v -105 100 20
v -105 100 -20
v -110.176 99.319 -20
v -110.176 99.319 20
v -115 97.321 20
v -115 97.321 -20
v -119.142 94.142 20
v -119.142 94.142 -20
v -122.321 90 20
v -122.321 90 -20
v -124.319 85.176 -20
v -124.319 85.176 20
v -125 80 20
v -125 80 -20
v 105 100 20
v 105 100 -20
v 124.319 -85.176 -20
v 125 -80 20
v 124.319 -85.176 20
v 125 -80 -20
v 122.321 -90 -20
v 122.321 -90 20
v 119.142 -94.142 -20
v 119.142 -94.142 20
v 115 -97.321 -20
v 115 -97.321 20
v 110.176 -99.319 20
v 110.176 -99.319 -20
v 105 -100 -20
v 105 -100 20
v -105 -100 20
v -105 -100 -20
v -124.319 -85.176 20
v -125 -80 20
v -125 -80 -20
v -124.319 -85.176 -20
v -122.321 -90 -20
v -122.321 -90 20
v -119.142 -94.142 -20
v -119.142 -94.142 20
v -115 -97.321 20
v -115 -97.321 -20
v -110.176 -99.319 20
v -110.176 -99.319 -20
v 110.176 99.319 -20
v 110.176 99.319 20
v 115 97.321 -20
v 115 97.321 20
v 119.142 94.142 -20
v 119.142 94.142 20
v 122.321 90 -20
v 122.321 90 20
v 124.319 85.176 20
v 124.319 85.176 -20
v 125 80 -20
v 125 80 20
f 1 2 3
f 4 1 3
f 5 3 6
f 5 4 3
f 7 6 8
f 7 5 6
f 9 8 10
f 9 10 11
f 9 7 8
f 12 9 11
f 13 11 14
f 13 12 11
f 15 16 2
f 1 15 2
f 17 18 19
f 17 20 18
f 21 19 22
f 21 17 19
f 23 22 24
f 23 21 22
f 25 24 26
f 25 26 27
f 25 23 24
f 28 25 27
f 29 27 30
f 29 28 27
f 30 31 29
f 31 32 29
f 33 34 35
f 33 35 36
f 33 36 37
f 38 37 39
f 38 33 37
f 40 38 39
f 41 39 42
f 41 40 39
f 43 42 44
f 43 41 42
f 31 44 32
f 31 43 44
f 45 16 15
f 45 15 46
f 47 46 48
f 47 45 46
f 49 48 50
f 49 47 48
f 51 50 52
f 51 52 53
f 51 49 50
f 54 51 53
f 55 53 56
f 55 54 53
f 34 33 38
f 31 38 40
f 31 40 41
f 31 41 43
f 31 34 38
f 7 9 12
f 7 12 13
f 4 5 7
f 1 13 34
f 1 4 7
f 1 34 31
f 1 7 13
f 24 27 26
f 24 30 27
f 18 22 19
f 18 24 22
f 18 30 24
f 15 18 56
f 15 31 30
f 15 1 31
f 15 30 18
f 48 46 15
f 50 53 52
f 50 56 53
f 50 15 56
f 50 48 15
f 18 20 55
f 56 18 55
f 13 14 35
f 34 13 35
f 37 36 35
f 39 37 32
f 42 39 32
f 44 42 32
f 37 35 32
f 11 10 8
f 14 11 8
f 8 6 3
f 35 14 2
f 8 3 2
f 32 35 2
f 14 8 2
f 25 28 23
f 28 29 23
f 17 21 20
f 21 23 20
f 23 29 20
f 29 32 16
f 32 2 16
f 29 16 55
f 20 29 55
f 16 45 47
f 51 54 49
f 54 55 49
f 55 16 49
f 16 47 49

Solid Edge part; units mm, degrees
sketch "Sketch1" plane through (0, 0, 0) normal (0, 0, 1) x (1, 0, 0)
  line L0 (125, 100) -> (-125, 100)
  line L1 (-125, 100) -> (-125, -100)
  line L2 (-125, -100) -> (125, -100)
  line L3 (125, -100) -> (125, 100)
extrude "Protrusion1" add sketch "Sketch1" along normal mid plane 40
fillet "Round_1" radius 20 3 edges at (125, -100, 0) (-125, -100, 0) (-125, 100, 0)
fillet "Round_2" radius 20 1 edges at (125, 100, 0)
properties material "Wood, Mahogany"
